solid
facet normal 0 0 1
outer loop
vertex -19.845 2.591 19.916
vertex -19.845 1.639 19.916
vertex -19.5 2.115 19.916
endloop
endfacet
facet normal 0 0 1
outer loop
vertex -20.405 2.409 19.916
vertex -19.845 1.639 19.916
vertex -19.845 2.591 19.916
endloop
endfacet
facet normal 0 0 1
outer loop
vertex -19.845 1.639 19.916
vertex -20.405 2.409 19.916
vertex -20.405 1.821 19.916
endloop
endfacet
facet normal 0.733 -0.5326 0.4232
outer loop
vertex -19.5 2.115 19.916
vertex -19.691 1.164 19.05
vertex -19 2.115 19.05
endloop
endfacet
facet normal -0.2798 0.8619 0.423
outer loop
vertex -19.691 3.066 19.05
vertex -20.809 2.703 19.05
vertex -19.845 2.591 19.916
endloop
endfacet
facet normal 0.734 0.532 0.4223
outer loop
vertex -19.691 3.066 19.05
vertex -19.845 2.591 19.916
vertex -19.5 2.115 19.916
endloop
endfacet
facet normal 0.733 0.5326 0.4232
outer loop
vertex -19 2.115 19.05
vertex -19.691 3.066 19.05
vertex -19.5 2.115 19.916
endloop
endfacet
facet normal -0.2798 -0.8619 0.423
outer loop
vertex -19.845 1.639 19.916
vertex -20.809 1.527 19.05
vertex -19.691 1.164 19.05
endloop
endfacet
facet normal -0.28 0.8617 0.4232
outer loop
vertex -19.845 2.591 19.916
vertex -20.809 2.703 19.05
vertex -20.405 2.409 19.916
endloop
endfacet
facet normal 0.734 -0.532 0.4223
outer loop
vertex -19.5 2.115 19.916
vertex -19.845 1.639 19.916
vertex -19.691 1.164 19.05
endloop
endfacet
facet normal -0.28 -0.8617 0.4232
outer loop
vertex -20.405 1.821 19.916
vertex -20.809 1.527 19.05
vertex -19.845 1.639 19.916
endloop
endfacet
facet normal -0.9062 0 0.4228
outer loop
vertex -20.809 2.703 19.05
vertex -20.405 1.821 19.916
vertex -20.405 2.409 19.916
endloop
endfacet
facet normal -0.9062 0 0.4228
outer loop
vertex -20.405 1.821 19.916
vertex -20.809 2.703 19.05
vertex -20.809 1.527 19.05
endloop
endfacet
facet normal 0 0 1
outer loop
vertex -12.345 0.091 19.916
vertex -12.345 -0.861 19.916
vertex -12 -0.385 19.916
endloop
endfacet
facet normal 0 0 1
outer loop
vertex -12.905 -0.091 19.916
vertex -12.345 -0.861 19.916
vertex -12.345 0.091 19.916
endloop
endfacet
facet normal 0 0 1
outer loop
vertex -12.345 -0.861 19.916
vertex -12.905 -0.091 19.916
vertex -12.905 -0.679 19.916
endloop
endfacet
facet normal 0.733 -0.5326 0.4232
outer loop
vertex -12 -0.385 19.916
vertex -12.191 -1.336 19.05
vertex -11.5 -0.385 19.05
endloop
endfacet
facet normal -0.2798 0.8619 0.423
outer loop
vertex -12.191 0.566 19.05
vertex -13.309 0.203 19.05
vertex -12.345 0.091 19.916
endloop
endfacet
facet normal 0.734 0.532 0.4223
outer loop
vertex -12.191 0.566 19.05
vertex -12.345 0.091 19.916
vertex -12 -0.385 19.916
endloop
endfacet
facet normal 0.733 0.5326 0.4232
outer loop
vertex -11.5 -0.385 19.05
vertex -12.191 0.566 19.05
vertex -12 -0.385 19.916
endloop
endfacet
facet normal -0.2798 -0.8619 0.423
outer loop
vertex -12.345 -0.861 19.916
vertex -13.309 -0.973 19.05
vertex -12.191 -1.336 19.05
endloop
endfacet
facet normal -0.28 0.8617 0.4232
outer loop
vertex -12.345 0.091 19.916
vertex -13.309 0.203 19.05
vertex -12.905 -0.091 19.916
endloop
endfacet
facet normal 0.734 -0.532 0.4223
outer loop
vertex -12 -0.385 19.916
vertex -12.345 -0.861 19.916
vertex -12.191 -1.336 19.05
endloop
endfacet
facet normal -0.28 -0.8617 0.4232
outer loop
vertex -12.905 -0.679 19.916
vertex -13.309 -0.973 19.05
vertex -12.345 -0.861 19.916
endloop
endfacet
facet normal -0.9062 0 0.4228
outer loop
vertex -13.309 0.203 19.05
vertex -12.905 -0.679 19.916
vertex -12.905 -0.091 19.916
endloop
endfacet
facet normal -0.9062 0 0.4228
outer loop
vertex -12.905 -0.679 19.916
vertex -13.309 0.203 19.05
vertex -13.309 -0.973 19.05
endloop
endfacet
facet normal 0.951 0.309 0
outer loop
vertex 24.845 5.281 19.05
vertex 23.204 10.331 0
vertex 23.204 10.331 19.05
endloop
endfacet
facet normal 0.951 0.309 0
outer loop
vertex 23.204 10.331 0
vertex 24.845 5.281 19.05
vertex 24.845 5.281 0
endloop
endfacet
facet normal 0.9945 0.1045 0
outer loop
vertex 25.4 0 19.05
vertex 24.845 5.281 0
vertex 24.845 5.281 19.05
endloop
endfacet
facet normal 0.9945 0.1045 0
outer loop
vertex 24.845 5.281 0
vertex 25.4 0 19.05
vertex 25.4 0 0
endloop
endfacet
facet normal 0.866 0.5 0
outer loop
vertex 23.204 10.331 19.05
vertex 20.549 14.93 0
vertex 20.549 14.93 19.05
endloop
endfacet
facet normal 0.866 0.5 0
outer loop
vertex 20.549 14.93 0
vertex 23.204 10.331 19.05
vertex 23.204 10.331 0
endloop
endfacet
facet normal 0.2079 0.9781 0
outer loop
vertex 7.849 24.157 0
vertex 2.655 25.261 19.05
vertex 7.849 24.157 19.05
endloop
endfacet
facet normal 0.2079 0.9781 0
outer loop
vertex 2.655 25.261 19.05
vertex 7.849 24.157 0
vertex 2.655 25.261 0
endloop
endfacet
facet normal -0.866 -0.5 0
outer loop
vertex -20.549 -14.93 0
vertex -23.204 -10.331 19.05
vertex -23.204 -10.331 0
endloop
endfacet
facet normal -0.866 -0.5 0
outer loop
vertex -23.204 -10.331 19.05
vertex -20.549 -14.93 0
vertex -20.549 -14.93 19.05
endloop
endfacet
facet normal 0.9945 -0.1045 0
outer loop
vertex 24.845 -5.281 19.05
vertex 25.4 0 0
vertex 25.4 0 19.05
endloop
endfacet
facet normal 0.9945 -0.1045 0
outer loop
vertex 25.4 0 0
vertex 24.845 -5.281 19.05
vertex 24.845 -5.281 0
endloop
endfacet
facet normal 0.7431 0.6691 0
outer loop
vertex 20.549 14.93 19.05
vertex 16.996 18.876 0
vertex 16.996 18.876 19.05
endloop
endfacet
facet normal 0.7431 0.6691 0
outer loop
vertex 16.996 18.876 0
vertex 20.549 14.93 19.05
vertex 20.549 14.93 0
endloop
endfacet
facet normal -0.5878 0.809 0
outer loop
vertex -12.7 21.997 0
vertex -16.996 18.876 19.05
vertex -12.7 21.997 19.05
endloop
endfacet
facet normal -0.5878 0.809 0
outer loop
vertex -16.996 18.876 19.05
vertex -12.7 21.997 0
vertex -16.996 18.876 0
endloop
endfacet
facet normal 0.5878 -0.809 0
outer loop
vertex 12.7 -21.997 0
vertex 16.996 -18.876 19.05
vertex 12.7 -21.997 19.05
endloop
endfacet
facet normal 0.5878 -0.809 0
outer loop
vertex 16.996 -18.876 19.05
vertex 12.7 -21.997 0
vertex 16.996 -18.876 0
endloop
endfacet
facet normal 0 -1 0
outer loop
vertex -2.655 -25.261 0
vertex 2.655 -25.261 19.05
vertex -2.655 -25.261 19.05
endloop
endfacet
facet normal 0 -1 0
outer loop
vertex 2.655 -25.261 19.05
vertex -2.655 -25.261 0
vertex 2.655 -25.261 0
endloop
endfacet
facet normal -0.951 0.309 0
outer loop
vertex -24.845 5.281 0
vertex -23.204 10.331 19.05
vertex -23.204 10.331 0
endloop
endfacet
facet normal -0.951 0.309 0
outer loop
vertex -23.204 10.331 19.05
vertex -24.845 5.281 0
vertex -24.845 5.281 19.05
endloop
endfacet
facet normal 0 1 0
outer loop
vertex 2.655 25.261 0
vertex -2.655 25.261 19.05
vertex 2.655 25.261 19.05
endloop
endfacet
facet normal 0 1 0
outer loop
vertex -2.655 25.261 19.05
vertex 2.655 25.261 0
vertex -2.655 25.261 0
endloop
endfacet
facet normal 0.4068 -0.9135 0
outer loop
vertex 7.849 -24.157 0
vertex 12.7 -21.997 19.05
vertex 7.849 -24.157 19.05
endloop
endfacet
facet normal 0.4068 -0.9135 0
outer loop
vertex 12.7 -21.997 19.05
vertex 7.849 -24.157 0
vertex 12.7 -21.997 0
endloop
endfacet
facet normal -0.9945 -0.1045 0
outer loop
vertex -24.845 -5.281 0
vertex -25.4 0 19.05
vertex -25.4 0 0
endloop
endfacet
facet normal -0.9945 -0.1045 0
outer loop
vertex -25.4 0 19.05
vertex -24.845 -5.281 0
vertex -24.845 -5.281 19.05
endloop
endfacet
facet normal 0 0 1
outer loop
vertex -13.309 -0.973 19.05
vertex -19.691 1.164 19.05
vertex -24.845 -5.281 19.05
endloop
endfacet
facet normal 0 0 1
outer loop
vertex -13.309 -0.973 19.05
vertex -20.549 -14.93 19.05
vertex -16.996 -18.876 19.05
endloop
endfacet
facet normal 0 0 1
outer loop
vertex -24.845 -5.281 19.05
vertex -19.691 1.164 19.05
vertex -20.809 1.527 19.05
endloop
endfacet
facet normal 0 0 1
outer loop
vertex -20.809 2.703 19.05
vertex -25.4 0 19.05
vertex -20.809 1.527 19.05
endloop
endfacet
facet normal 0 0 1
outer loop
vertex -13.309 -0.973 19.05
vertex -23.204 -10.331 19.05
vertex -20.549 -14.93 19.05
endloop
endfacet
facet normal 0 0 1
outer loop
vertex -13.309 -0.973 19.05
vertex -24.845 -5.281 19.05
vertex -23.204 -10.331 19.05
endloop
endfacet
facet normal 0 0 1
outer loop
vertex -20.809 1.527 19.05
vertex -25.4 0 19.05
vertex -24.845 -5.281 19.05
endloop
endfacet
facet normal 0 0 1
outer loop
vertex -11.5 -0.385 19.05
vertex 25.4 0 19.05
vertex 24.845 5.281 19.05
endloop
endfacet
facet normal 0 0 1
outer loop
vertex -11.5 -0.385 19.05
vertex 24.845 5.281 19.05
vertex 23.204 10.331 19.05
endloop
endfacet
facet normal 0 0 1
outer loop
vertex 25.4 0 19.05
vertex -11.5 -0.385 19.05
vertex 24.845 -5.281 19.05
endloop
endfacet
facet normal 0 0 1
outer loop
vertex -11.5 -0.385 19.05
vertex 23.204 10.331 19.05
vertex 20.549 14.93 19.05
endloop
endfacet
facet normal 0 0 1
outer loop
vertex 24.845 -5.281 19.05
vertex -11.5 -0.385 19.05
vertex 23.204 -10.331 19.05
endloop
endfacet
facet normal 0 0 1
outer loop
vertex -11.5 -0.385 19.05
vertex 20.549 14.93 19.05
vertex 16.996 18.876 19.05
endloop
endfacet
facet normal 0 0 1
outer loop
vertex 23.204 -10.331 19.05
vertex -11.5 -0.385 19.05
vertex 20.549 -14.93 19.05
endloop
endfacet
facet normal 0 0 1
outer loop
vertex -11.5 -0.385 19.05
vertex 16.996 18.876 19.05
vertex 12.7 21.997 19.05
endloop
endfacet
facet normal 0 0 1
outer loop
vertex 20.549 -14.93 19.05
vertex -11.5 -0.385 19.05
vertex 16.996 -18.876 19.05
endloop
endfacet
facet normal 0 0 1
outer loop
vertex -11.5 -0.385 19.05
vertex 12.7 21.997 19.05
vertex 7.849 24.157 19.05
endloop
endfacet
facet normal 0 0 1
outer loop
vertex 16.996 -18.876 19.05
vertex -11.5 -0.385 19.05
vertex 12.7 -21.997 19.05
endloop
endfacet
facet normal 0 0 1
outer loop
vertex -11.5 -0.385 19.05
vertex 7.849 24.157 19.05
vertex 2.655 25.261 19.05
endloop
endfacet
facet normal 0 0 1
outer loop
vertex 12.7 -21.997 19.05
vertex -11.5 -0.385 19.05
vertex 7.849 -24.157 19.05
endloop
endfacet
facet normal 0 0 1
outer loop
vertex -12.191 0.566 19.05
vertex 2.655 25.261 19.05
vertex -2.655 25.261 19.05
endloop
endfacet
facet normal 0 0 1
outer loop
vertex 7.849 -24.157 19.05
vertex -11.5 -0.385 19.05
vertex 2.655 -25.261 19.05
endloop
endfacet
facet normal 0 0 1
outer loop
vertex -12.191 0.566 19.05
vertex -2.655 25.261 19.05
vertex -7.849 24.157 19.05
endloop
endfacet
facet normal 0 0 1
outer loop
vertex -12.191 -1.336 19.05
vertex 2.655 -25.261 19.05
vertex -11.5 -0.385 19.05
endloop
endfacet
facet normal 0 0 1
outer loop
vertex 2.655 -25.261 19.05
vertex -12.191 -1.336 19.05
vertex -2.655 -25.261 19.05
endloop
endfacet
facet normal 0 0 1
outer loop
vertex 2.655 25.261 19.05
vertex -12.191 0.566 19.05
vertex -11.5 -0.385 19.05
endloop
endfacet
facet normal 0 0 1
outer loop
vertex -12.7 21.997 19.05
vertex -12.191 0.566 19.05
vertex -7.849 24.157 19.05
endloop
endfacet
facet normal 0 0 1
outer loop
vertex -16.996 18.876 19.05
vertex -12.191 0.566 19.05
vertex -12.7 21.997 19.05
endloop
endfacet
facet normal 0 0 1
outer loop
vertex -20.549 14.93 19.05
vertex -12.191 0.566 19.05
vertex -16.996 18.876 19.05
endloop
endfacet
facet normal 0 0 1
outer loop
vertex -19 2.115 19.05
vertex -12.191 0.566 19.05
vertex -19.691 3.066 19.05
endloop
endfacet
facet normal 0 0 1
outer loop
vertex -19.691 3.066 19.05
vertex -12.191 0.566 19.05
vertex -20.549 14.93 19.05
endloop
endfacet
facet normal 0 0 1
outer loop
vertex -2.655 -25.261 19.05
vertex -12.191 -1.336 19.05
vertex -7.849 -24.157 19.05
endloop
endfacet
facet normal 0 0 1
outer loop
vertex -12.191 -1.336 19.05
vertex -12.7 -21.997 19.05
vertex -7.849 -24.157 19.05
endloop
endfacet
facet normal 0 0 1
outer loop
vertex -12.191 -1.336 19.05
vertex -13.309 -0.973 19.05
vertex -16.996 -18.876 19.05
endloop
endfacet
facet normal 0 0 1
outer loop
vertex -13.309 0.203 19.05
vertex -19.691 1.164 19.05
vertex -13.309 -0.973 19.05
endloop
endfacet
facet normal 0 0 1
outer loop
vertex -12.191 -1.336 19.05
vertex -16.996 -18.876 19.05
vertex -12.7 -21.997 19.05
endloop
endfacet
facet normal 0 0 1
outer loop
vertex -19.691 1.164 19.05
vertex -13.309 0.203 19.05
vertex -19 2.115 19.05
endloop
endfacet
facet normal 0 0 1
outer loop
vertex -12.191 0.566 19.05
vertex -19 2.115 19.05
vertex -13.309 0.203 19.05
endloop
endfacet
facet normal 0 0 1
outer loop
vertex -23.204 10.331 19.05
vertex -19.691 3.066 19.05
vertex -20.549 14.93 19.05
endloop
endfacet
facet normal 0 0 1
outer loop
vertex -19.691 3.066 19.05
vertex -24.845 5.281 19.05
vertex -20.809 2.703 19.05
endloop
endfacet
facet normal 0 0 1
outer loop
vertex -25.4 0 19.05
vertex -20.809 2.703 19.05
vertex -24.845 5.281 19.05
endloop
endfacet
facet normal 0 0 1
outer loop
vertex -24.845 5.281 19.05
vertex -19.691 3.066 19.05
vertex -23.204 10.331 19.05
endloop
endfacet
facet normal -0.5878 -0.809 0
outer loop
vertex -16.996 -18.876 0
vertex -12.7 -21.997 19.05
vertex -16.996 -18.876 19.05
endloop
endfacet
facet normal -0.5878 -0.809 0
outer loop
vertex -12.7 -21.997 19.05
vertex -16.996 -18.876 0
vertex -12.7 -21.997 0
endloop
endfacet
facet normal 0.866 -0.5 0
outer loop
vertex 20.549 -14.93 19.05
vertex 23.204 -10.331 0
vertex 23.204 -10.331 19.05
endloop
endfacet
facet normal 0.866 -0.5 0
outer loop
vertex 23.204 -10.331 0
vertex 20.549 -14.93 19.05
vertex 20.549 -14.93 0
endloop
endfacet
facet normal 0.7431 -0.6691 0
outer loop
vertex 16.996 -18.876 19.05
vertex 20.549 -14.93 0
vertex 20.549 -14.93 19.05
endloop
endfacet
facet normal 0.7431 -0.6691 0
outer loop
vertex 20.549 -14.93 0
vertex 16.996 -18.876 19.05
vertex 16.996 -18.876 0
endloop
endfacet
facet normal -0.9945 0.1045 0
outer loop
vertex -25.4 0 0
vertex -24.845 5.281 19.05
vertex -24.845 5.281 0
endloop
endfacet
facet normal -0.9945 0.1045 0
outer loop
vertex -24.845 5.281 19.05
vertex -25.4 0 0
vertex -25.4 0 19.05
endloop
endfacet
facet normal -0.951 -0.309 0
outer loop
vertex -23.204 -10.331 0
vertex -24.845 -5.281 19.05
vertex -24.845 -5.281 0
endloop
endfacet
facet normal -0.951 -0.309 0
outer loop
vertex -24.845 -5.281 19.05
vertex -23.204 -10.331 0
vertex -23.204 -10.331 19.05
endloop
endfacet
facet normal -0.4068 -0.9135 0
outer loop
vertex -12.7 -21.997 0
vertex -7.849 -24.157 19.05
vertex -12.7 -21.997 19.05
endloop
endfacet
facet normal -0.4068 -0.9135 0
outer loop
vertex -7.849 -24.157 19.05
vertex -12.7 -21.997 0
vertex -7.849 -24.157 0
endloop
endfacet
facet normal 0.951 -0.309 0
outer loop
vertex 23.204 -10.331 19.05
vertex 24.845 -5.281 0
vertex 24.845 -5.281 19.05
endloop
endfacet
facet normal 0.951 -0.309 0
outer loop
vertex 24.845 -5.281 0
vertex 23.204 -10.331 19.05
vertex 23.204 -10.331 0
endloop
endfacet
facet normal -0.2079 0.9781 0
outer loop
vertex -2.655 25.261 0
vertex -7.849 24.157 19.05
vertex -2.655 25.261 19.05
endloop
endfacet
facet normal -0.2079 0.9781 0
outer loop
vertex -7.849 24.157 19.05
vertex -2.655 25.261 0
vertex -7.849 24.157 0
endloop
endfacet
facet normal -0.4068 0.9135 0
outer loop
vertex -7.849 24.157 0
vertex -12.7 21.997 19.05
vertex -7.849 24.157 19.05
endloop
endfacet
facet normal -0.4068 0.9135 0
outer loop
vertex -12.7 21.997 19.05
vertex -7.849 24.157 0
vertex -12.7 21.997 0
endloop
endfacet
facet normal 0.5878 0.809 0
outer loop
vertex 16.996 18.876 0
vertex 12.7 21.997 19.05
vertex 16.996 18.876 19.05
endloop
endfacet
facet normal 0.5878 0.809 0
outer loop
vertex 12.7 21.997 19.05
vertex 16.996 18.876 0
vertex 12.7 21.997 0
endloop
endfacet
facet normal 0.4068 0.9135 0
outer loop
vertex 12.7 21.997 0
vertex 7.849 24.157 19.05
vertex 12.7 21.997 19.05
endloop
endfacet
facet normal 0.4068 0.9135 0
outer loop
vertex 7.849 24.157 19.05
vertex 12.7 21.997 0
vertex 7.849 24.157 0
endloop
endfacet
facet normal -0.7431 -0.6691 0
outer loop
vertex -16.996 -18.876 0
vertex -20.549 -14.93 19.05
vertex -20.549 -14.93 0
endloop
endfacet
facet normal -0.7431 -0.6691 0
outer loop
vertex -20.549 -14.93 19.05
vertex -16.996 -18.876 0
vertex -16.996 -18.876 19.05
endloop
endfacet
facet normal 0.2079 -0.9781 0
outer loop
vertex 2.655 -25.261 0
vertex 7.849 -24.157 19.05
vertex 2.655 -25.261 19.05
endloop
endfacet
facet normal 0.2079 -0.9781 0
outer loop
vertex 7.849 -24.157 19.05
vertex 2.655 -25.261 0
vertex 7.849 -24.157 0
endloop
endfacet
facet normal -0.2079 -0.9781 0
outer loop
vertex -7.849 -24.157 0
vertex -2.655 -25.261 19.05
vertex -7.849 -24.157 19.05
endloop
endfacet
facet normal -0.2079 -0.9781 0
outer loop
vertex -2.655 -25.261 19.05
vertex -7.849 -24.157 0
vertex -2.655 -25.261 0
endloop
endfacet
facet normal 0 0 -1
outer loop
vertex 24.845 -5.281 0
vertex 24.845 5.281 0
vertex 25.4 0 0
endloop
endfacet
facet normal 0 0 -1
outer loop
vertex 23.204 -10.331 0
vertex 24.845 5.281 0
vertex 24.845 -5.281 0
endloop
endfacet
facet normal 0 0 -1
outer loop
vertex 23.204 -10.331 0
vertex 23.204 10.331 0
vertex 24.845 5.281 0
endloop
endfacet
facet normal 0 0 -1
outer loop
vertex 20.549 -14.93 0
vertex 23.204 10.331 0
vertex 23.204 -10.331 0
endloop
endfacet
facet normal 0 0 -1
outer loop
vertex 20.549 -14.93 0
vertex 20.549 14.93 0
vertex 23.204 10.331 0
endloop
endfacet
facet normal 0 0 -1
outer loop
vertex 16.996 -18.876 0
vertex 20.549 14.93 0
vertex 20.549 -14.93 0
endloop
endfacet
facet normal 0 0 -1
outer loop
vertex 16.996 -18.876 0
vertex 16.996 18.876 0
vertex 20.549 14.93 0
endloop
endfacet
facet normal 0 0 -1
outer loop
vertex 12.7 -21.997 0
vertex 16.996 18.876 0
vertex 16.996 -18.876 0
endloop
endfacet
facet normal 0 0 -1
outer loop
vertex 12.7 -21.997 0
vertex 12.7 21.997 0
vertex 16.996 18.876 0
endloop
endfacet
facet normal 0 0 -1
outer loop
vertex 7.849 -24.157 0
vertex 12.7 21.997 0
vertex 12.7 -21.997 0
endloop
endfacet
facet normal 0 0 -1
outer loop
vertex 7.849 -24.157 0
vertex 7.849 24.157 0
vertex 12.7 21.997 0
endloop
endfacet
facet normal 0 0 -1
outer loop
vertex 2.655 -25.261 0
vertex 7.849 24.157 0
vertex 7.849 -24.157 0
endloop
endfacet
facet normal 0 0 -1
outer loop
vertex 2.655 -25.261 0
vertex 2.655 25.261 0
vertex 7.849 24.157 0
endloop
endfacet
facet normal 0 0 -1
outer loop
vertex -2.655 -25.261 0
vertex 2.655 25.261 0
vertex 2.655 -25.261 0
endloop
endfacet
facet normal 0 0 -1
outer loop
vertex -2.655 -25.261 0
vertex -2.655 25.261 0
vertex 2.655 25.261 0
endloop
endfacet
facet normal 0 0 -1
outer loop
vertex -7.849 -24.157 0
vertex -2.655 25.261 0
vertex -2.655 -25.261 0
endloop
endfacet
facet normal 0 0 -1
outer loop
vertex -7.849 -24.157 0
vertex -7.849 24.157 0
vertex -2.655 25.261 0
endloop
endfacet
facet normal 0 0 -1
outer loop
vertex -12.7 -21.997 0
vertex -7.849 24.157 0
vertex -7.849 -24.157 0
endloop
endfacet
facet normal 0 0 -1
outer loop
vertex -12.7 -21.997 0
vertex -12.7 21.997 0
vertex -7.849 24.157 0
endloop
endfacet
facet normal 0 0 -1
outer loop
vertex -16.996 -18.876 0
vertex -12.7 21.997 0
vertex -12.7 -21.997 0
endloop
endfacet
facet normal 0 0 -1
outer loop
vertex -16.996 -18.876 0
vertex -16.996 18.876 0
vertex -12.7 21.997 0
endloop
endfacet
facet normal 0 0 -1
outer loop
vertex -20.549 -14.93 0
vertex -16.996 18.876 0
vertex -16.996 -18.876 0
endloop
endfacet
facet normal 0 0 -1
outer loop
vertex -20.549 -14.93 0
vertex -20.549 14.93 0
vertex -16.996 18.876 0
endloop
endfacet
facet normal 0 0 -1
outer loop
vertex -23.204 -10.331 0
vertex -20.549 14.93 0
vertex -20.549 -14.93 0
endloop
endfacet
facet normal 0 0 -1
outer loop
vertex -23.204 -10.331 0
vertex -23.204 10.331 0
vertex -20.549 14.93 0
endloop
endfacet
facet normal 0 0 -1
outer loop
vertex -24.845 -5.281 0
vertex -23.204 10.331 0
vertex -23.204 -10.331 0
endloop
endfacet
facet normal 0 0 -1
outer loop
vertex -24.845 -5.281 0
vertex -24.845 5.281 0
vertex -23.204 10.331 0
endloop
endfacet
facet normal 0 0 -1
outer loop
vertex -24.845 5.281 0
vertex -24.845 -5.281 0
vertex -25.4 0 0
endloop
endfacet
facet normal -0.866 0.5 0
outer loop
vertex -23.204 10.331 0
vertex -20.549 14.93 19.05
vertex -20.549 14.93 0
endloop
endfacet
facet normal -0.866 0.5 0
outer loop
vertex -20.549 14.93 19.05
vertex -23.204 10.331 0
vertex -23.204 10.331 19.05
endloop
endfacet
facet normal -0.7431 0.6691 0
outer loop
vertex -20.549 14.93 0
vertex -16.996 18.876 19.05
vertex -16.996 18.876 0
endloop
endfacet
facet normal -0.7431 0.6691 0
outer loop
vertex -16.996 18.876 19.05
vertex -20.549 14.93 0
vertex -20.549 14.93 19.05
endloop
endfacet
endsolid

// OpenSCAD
cylinder(h = 19.05, r = 25.4);
translate([-20, -2.26, 19.05]) {
    translate([0, 4.375, 0]) sphere(1);
    translate([7.5, 1.875, 0]) sphere(1);
}
